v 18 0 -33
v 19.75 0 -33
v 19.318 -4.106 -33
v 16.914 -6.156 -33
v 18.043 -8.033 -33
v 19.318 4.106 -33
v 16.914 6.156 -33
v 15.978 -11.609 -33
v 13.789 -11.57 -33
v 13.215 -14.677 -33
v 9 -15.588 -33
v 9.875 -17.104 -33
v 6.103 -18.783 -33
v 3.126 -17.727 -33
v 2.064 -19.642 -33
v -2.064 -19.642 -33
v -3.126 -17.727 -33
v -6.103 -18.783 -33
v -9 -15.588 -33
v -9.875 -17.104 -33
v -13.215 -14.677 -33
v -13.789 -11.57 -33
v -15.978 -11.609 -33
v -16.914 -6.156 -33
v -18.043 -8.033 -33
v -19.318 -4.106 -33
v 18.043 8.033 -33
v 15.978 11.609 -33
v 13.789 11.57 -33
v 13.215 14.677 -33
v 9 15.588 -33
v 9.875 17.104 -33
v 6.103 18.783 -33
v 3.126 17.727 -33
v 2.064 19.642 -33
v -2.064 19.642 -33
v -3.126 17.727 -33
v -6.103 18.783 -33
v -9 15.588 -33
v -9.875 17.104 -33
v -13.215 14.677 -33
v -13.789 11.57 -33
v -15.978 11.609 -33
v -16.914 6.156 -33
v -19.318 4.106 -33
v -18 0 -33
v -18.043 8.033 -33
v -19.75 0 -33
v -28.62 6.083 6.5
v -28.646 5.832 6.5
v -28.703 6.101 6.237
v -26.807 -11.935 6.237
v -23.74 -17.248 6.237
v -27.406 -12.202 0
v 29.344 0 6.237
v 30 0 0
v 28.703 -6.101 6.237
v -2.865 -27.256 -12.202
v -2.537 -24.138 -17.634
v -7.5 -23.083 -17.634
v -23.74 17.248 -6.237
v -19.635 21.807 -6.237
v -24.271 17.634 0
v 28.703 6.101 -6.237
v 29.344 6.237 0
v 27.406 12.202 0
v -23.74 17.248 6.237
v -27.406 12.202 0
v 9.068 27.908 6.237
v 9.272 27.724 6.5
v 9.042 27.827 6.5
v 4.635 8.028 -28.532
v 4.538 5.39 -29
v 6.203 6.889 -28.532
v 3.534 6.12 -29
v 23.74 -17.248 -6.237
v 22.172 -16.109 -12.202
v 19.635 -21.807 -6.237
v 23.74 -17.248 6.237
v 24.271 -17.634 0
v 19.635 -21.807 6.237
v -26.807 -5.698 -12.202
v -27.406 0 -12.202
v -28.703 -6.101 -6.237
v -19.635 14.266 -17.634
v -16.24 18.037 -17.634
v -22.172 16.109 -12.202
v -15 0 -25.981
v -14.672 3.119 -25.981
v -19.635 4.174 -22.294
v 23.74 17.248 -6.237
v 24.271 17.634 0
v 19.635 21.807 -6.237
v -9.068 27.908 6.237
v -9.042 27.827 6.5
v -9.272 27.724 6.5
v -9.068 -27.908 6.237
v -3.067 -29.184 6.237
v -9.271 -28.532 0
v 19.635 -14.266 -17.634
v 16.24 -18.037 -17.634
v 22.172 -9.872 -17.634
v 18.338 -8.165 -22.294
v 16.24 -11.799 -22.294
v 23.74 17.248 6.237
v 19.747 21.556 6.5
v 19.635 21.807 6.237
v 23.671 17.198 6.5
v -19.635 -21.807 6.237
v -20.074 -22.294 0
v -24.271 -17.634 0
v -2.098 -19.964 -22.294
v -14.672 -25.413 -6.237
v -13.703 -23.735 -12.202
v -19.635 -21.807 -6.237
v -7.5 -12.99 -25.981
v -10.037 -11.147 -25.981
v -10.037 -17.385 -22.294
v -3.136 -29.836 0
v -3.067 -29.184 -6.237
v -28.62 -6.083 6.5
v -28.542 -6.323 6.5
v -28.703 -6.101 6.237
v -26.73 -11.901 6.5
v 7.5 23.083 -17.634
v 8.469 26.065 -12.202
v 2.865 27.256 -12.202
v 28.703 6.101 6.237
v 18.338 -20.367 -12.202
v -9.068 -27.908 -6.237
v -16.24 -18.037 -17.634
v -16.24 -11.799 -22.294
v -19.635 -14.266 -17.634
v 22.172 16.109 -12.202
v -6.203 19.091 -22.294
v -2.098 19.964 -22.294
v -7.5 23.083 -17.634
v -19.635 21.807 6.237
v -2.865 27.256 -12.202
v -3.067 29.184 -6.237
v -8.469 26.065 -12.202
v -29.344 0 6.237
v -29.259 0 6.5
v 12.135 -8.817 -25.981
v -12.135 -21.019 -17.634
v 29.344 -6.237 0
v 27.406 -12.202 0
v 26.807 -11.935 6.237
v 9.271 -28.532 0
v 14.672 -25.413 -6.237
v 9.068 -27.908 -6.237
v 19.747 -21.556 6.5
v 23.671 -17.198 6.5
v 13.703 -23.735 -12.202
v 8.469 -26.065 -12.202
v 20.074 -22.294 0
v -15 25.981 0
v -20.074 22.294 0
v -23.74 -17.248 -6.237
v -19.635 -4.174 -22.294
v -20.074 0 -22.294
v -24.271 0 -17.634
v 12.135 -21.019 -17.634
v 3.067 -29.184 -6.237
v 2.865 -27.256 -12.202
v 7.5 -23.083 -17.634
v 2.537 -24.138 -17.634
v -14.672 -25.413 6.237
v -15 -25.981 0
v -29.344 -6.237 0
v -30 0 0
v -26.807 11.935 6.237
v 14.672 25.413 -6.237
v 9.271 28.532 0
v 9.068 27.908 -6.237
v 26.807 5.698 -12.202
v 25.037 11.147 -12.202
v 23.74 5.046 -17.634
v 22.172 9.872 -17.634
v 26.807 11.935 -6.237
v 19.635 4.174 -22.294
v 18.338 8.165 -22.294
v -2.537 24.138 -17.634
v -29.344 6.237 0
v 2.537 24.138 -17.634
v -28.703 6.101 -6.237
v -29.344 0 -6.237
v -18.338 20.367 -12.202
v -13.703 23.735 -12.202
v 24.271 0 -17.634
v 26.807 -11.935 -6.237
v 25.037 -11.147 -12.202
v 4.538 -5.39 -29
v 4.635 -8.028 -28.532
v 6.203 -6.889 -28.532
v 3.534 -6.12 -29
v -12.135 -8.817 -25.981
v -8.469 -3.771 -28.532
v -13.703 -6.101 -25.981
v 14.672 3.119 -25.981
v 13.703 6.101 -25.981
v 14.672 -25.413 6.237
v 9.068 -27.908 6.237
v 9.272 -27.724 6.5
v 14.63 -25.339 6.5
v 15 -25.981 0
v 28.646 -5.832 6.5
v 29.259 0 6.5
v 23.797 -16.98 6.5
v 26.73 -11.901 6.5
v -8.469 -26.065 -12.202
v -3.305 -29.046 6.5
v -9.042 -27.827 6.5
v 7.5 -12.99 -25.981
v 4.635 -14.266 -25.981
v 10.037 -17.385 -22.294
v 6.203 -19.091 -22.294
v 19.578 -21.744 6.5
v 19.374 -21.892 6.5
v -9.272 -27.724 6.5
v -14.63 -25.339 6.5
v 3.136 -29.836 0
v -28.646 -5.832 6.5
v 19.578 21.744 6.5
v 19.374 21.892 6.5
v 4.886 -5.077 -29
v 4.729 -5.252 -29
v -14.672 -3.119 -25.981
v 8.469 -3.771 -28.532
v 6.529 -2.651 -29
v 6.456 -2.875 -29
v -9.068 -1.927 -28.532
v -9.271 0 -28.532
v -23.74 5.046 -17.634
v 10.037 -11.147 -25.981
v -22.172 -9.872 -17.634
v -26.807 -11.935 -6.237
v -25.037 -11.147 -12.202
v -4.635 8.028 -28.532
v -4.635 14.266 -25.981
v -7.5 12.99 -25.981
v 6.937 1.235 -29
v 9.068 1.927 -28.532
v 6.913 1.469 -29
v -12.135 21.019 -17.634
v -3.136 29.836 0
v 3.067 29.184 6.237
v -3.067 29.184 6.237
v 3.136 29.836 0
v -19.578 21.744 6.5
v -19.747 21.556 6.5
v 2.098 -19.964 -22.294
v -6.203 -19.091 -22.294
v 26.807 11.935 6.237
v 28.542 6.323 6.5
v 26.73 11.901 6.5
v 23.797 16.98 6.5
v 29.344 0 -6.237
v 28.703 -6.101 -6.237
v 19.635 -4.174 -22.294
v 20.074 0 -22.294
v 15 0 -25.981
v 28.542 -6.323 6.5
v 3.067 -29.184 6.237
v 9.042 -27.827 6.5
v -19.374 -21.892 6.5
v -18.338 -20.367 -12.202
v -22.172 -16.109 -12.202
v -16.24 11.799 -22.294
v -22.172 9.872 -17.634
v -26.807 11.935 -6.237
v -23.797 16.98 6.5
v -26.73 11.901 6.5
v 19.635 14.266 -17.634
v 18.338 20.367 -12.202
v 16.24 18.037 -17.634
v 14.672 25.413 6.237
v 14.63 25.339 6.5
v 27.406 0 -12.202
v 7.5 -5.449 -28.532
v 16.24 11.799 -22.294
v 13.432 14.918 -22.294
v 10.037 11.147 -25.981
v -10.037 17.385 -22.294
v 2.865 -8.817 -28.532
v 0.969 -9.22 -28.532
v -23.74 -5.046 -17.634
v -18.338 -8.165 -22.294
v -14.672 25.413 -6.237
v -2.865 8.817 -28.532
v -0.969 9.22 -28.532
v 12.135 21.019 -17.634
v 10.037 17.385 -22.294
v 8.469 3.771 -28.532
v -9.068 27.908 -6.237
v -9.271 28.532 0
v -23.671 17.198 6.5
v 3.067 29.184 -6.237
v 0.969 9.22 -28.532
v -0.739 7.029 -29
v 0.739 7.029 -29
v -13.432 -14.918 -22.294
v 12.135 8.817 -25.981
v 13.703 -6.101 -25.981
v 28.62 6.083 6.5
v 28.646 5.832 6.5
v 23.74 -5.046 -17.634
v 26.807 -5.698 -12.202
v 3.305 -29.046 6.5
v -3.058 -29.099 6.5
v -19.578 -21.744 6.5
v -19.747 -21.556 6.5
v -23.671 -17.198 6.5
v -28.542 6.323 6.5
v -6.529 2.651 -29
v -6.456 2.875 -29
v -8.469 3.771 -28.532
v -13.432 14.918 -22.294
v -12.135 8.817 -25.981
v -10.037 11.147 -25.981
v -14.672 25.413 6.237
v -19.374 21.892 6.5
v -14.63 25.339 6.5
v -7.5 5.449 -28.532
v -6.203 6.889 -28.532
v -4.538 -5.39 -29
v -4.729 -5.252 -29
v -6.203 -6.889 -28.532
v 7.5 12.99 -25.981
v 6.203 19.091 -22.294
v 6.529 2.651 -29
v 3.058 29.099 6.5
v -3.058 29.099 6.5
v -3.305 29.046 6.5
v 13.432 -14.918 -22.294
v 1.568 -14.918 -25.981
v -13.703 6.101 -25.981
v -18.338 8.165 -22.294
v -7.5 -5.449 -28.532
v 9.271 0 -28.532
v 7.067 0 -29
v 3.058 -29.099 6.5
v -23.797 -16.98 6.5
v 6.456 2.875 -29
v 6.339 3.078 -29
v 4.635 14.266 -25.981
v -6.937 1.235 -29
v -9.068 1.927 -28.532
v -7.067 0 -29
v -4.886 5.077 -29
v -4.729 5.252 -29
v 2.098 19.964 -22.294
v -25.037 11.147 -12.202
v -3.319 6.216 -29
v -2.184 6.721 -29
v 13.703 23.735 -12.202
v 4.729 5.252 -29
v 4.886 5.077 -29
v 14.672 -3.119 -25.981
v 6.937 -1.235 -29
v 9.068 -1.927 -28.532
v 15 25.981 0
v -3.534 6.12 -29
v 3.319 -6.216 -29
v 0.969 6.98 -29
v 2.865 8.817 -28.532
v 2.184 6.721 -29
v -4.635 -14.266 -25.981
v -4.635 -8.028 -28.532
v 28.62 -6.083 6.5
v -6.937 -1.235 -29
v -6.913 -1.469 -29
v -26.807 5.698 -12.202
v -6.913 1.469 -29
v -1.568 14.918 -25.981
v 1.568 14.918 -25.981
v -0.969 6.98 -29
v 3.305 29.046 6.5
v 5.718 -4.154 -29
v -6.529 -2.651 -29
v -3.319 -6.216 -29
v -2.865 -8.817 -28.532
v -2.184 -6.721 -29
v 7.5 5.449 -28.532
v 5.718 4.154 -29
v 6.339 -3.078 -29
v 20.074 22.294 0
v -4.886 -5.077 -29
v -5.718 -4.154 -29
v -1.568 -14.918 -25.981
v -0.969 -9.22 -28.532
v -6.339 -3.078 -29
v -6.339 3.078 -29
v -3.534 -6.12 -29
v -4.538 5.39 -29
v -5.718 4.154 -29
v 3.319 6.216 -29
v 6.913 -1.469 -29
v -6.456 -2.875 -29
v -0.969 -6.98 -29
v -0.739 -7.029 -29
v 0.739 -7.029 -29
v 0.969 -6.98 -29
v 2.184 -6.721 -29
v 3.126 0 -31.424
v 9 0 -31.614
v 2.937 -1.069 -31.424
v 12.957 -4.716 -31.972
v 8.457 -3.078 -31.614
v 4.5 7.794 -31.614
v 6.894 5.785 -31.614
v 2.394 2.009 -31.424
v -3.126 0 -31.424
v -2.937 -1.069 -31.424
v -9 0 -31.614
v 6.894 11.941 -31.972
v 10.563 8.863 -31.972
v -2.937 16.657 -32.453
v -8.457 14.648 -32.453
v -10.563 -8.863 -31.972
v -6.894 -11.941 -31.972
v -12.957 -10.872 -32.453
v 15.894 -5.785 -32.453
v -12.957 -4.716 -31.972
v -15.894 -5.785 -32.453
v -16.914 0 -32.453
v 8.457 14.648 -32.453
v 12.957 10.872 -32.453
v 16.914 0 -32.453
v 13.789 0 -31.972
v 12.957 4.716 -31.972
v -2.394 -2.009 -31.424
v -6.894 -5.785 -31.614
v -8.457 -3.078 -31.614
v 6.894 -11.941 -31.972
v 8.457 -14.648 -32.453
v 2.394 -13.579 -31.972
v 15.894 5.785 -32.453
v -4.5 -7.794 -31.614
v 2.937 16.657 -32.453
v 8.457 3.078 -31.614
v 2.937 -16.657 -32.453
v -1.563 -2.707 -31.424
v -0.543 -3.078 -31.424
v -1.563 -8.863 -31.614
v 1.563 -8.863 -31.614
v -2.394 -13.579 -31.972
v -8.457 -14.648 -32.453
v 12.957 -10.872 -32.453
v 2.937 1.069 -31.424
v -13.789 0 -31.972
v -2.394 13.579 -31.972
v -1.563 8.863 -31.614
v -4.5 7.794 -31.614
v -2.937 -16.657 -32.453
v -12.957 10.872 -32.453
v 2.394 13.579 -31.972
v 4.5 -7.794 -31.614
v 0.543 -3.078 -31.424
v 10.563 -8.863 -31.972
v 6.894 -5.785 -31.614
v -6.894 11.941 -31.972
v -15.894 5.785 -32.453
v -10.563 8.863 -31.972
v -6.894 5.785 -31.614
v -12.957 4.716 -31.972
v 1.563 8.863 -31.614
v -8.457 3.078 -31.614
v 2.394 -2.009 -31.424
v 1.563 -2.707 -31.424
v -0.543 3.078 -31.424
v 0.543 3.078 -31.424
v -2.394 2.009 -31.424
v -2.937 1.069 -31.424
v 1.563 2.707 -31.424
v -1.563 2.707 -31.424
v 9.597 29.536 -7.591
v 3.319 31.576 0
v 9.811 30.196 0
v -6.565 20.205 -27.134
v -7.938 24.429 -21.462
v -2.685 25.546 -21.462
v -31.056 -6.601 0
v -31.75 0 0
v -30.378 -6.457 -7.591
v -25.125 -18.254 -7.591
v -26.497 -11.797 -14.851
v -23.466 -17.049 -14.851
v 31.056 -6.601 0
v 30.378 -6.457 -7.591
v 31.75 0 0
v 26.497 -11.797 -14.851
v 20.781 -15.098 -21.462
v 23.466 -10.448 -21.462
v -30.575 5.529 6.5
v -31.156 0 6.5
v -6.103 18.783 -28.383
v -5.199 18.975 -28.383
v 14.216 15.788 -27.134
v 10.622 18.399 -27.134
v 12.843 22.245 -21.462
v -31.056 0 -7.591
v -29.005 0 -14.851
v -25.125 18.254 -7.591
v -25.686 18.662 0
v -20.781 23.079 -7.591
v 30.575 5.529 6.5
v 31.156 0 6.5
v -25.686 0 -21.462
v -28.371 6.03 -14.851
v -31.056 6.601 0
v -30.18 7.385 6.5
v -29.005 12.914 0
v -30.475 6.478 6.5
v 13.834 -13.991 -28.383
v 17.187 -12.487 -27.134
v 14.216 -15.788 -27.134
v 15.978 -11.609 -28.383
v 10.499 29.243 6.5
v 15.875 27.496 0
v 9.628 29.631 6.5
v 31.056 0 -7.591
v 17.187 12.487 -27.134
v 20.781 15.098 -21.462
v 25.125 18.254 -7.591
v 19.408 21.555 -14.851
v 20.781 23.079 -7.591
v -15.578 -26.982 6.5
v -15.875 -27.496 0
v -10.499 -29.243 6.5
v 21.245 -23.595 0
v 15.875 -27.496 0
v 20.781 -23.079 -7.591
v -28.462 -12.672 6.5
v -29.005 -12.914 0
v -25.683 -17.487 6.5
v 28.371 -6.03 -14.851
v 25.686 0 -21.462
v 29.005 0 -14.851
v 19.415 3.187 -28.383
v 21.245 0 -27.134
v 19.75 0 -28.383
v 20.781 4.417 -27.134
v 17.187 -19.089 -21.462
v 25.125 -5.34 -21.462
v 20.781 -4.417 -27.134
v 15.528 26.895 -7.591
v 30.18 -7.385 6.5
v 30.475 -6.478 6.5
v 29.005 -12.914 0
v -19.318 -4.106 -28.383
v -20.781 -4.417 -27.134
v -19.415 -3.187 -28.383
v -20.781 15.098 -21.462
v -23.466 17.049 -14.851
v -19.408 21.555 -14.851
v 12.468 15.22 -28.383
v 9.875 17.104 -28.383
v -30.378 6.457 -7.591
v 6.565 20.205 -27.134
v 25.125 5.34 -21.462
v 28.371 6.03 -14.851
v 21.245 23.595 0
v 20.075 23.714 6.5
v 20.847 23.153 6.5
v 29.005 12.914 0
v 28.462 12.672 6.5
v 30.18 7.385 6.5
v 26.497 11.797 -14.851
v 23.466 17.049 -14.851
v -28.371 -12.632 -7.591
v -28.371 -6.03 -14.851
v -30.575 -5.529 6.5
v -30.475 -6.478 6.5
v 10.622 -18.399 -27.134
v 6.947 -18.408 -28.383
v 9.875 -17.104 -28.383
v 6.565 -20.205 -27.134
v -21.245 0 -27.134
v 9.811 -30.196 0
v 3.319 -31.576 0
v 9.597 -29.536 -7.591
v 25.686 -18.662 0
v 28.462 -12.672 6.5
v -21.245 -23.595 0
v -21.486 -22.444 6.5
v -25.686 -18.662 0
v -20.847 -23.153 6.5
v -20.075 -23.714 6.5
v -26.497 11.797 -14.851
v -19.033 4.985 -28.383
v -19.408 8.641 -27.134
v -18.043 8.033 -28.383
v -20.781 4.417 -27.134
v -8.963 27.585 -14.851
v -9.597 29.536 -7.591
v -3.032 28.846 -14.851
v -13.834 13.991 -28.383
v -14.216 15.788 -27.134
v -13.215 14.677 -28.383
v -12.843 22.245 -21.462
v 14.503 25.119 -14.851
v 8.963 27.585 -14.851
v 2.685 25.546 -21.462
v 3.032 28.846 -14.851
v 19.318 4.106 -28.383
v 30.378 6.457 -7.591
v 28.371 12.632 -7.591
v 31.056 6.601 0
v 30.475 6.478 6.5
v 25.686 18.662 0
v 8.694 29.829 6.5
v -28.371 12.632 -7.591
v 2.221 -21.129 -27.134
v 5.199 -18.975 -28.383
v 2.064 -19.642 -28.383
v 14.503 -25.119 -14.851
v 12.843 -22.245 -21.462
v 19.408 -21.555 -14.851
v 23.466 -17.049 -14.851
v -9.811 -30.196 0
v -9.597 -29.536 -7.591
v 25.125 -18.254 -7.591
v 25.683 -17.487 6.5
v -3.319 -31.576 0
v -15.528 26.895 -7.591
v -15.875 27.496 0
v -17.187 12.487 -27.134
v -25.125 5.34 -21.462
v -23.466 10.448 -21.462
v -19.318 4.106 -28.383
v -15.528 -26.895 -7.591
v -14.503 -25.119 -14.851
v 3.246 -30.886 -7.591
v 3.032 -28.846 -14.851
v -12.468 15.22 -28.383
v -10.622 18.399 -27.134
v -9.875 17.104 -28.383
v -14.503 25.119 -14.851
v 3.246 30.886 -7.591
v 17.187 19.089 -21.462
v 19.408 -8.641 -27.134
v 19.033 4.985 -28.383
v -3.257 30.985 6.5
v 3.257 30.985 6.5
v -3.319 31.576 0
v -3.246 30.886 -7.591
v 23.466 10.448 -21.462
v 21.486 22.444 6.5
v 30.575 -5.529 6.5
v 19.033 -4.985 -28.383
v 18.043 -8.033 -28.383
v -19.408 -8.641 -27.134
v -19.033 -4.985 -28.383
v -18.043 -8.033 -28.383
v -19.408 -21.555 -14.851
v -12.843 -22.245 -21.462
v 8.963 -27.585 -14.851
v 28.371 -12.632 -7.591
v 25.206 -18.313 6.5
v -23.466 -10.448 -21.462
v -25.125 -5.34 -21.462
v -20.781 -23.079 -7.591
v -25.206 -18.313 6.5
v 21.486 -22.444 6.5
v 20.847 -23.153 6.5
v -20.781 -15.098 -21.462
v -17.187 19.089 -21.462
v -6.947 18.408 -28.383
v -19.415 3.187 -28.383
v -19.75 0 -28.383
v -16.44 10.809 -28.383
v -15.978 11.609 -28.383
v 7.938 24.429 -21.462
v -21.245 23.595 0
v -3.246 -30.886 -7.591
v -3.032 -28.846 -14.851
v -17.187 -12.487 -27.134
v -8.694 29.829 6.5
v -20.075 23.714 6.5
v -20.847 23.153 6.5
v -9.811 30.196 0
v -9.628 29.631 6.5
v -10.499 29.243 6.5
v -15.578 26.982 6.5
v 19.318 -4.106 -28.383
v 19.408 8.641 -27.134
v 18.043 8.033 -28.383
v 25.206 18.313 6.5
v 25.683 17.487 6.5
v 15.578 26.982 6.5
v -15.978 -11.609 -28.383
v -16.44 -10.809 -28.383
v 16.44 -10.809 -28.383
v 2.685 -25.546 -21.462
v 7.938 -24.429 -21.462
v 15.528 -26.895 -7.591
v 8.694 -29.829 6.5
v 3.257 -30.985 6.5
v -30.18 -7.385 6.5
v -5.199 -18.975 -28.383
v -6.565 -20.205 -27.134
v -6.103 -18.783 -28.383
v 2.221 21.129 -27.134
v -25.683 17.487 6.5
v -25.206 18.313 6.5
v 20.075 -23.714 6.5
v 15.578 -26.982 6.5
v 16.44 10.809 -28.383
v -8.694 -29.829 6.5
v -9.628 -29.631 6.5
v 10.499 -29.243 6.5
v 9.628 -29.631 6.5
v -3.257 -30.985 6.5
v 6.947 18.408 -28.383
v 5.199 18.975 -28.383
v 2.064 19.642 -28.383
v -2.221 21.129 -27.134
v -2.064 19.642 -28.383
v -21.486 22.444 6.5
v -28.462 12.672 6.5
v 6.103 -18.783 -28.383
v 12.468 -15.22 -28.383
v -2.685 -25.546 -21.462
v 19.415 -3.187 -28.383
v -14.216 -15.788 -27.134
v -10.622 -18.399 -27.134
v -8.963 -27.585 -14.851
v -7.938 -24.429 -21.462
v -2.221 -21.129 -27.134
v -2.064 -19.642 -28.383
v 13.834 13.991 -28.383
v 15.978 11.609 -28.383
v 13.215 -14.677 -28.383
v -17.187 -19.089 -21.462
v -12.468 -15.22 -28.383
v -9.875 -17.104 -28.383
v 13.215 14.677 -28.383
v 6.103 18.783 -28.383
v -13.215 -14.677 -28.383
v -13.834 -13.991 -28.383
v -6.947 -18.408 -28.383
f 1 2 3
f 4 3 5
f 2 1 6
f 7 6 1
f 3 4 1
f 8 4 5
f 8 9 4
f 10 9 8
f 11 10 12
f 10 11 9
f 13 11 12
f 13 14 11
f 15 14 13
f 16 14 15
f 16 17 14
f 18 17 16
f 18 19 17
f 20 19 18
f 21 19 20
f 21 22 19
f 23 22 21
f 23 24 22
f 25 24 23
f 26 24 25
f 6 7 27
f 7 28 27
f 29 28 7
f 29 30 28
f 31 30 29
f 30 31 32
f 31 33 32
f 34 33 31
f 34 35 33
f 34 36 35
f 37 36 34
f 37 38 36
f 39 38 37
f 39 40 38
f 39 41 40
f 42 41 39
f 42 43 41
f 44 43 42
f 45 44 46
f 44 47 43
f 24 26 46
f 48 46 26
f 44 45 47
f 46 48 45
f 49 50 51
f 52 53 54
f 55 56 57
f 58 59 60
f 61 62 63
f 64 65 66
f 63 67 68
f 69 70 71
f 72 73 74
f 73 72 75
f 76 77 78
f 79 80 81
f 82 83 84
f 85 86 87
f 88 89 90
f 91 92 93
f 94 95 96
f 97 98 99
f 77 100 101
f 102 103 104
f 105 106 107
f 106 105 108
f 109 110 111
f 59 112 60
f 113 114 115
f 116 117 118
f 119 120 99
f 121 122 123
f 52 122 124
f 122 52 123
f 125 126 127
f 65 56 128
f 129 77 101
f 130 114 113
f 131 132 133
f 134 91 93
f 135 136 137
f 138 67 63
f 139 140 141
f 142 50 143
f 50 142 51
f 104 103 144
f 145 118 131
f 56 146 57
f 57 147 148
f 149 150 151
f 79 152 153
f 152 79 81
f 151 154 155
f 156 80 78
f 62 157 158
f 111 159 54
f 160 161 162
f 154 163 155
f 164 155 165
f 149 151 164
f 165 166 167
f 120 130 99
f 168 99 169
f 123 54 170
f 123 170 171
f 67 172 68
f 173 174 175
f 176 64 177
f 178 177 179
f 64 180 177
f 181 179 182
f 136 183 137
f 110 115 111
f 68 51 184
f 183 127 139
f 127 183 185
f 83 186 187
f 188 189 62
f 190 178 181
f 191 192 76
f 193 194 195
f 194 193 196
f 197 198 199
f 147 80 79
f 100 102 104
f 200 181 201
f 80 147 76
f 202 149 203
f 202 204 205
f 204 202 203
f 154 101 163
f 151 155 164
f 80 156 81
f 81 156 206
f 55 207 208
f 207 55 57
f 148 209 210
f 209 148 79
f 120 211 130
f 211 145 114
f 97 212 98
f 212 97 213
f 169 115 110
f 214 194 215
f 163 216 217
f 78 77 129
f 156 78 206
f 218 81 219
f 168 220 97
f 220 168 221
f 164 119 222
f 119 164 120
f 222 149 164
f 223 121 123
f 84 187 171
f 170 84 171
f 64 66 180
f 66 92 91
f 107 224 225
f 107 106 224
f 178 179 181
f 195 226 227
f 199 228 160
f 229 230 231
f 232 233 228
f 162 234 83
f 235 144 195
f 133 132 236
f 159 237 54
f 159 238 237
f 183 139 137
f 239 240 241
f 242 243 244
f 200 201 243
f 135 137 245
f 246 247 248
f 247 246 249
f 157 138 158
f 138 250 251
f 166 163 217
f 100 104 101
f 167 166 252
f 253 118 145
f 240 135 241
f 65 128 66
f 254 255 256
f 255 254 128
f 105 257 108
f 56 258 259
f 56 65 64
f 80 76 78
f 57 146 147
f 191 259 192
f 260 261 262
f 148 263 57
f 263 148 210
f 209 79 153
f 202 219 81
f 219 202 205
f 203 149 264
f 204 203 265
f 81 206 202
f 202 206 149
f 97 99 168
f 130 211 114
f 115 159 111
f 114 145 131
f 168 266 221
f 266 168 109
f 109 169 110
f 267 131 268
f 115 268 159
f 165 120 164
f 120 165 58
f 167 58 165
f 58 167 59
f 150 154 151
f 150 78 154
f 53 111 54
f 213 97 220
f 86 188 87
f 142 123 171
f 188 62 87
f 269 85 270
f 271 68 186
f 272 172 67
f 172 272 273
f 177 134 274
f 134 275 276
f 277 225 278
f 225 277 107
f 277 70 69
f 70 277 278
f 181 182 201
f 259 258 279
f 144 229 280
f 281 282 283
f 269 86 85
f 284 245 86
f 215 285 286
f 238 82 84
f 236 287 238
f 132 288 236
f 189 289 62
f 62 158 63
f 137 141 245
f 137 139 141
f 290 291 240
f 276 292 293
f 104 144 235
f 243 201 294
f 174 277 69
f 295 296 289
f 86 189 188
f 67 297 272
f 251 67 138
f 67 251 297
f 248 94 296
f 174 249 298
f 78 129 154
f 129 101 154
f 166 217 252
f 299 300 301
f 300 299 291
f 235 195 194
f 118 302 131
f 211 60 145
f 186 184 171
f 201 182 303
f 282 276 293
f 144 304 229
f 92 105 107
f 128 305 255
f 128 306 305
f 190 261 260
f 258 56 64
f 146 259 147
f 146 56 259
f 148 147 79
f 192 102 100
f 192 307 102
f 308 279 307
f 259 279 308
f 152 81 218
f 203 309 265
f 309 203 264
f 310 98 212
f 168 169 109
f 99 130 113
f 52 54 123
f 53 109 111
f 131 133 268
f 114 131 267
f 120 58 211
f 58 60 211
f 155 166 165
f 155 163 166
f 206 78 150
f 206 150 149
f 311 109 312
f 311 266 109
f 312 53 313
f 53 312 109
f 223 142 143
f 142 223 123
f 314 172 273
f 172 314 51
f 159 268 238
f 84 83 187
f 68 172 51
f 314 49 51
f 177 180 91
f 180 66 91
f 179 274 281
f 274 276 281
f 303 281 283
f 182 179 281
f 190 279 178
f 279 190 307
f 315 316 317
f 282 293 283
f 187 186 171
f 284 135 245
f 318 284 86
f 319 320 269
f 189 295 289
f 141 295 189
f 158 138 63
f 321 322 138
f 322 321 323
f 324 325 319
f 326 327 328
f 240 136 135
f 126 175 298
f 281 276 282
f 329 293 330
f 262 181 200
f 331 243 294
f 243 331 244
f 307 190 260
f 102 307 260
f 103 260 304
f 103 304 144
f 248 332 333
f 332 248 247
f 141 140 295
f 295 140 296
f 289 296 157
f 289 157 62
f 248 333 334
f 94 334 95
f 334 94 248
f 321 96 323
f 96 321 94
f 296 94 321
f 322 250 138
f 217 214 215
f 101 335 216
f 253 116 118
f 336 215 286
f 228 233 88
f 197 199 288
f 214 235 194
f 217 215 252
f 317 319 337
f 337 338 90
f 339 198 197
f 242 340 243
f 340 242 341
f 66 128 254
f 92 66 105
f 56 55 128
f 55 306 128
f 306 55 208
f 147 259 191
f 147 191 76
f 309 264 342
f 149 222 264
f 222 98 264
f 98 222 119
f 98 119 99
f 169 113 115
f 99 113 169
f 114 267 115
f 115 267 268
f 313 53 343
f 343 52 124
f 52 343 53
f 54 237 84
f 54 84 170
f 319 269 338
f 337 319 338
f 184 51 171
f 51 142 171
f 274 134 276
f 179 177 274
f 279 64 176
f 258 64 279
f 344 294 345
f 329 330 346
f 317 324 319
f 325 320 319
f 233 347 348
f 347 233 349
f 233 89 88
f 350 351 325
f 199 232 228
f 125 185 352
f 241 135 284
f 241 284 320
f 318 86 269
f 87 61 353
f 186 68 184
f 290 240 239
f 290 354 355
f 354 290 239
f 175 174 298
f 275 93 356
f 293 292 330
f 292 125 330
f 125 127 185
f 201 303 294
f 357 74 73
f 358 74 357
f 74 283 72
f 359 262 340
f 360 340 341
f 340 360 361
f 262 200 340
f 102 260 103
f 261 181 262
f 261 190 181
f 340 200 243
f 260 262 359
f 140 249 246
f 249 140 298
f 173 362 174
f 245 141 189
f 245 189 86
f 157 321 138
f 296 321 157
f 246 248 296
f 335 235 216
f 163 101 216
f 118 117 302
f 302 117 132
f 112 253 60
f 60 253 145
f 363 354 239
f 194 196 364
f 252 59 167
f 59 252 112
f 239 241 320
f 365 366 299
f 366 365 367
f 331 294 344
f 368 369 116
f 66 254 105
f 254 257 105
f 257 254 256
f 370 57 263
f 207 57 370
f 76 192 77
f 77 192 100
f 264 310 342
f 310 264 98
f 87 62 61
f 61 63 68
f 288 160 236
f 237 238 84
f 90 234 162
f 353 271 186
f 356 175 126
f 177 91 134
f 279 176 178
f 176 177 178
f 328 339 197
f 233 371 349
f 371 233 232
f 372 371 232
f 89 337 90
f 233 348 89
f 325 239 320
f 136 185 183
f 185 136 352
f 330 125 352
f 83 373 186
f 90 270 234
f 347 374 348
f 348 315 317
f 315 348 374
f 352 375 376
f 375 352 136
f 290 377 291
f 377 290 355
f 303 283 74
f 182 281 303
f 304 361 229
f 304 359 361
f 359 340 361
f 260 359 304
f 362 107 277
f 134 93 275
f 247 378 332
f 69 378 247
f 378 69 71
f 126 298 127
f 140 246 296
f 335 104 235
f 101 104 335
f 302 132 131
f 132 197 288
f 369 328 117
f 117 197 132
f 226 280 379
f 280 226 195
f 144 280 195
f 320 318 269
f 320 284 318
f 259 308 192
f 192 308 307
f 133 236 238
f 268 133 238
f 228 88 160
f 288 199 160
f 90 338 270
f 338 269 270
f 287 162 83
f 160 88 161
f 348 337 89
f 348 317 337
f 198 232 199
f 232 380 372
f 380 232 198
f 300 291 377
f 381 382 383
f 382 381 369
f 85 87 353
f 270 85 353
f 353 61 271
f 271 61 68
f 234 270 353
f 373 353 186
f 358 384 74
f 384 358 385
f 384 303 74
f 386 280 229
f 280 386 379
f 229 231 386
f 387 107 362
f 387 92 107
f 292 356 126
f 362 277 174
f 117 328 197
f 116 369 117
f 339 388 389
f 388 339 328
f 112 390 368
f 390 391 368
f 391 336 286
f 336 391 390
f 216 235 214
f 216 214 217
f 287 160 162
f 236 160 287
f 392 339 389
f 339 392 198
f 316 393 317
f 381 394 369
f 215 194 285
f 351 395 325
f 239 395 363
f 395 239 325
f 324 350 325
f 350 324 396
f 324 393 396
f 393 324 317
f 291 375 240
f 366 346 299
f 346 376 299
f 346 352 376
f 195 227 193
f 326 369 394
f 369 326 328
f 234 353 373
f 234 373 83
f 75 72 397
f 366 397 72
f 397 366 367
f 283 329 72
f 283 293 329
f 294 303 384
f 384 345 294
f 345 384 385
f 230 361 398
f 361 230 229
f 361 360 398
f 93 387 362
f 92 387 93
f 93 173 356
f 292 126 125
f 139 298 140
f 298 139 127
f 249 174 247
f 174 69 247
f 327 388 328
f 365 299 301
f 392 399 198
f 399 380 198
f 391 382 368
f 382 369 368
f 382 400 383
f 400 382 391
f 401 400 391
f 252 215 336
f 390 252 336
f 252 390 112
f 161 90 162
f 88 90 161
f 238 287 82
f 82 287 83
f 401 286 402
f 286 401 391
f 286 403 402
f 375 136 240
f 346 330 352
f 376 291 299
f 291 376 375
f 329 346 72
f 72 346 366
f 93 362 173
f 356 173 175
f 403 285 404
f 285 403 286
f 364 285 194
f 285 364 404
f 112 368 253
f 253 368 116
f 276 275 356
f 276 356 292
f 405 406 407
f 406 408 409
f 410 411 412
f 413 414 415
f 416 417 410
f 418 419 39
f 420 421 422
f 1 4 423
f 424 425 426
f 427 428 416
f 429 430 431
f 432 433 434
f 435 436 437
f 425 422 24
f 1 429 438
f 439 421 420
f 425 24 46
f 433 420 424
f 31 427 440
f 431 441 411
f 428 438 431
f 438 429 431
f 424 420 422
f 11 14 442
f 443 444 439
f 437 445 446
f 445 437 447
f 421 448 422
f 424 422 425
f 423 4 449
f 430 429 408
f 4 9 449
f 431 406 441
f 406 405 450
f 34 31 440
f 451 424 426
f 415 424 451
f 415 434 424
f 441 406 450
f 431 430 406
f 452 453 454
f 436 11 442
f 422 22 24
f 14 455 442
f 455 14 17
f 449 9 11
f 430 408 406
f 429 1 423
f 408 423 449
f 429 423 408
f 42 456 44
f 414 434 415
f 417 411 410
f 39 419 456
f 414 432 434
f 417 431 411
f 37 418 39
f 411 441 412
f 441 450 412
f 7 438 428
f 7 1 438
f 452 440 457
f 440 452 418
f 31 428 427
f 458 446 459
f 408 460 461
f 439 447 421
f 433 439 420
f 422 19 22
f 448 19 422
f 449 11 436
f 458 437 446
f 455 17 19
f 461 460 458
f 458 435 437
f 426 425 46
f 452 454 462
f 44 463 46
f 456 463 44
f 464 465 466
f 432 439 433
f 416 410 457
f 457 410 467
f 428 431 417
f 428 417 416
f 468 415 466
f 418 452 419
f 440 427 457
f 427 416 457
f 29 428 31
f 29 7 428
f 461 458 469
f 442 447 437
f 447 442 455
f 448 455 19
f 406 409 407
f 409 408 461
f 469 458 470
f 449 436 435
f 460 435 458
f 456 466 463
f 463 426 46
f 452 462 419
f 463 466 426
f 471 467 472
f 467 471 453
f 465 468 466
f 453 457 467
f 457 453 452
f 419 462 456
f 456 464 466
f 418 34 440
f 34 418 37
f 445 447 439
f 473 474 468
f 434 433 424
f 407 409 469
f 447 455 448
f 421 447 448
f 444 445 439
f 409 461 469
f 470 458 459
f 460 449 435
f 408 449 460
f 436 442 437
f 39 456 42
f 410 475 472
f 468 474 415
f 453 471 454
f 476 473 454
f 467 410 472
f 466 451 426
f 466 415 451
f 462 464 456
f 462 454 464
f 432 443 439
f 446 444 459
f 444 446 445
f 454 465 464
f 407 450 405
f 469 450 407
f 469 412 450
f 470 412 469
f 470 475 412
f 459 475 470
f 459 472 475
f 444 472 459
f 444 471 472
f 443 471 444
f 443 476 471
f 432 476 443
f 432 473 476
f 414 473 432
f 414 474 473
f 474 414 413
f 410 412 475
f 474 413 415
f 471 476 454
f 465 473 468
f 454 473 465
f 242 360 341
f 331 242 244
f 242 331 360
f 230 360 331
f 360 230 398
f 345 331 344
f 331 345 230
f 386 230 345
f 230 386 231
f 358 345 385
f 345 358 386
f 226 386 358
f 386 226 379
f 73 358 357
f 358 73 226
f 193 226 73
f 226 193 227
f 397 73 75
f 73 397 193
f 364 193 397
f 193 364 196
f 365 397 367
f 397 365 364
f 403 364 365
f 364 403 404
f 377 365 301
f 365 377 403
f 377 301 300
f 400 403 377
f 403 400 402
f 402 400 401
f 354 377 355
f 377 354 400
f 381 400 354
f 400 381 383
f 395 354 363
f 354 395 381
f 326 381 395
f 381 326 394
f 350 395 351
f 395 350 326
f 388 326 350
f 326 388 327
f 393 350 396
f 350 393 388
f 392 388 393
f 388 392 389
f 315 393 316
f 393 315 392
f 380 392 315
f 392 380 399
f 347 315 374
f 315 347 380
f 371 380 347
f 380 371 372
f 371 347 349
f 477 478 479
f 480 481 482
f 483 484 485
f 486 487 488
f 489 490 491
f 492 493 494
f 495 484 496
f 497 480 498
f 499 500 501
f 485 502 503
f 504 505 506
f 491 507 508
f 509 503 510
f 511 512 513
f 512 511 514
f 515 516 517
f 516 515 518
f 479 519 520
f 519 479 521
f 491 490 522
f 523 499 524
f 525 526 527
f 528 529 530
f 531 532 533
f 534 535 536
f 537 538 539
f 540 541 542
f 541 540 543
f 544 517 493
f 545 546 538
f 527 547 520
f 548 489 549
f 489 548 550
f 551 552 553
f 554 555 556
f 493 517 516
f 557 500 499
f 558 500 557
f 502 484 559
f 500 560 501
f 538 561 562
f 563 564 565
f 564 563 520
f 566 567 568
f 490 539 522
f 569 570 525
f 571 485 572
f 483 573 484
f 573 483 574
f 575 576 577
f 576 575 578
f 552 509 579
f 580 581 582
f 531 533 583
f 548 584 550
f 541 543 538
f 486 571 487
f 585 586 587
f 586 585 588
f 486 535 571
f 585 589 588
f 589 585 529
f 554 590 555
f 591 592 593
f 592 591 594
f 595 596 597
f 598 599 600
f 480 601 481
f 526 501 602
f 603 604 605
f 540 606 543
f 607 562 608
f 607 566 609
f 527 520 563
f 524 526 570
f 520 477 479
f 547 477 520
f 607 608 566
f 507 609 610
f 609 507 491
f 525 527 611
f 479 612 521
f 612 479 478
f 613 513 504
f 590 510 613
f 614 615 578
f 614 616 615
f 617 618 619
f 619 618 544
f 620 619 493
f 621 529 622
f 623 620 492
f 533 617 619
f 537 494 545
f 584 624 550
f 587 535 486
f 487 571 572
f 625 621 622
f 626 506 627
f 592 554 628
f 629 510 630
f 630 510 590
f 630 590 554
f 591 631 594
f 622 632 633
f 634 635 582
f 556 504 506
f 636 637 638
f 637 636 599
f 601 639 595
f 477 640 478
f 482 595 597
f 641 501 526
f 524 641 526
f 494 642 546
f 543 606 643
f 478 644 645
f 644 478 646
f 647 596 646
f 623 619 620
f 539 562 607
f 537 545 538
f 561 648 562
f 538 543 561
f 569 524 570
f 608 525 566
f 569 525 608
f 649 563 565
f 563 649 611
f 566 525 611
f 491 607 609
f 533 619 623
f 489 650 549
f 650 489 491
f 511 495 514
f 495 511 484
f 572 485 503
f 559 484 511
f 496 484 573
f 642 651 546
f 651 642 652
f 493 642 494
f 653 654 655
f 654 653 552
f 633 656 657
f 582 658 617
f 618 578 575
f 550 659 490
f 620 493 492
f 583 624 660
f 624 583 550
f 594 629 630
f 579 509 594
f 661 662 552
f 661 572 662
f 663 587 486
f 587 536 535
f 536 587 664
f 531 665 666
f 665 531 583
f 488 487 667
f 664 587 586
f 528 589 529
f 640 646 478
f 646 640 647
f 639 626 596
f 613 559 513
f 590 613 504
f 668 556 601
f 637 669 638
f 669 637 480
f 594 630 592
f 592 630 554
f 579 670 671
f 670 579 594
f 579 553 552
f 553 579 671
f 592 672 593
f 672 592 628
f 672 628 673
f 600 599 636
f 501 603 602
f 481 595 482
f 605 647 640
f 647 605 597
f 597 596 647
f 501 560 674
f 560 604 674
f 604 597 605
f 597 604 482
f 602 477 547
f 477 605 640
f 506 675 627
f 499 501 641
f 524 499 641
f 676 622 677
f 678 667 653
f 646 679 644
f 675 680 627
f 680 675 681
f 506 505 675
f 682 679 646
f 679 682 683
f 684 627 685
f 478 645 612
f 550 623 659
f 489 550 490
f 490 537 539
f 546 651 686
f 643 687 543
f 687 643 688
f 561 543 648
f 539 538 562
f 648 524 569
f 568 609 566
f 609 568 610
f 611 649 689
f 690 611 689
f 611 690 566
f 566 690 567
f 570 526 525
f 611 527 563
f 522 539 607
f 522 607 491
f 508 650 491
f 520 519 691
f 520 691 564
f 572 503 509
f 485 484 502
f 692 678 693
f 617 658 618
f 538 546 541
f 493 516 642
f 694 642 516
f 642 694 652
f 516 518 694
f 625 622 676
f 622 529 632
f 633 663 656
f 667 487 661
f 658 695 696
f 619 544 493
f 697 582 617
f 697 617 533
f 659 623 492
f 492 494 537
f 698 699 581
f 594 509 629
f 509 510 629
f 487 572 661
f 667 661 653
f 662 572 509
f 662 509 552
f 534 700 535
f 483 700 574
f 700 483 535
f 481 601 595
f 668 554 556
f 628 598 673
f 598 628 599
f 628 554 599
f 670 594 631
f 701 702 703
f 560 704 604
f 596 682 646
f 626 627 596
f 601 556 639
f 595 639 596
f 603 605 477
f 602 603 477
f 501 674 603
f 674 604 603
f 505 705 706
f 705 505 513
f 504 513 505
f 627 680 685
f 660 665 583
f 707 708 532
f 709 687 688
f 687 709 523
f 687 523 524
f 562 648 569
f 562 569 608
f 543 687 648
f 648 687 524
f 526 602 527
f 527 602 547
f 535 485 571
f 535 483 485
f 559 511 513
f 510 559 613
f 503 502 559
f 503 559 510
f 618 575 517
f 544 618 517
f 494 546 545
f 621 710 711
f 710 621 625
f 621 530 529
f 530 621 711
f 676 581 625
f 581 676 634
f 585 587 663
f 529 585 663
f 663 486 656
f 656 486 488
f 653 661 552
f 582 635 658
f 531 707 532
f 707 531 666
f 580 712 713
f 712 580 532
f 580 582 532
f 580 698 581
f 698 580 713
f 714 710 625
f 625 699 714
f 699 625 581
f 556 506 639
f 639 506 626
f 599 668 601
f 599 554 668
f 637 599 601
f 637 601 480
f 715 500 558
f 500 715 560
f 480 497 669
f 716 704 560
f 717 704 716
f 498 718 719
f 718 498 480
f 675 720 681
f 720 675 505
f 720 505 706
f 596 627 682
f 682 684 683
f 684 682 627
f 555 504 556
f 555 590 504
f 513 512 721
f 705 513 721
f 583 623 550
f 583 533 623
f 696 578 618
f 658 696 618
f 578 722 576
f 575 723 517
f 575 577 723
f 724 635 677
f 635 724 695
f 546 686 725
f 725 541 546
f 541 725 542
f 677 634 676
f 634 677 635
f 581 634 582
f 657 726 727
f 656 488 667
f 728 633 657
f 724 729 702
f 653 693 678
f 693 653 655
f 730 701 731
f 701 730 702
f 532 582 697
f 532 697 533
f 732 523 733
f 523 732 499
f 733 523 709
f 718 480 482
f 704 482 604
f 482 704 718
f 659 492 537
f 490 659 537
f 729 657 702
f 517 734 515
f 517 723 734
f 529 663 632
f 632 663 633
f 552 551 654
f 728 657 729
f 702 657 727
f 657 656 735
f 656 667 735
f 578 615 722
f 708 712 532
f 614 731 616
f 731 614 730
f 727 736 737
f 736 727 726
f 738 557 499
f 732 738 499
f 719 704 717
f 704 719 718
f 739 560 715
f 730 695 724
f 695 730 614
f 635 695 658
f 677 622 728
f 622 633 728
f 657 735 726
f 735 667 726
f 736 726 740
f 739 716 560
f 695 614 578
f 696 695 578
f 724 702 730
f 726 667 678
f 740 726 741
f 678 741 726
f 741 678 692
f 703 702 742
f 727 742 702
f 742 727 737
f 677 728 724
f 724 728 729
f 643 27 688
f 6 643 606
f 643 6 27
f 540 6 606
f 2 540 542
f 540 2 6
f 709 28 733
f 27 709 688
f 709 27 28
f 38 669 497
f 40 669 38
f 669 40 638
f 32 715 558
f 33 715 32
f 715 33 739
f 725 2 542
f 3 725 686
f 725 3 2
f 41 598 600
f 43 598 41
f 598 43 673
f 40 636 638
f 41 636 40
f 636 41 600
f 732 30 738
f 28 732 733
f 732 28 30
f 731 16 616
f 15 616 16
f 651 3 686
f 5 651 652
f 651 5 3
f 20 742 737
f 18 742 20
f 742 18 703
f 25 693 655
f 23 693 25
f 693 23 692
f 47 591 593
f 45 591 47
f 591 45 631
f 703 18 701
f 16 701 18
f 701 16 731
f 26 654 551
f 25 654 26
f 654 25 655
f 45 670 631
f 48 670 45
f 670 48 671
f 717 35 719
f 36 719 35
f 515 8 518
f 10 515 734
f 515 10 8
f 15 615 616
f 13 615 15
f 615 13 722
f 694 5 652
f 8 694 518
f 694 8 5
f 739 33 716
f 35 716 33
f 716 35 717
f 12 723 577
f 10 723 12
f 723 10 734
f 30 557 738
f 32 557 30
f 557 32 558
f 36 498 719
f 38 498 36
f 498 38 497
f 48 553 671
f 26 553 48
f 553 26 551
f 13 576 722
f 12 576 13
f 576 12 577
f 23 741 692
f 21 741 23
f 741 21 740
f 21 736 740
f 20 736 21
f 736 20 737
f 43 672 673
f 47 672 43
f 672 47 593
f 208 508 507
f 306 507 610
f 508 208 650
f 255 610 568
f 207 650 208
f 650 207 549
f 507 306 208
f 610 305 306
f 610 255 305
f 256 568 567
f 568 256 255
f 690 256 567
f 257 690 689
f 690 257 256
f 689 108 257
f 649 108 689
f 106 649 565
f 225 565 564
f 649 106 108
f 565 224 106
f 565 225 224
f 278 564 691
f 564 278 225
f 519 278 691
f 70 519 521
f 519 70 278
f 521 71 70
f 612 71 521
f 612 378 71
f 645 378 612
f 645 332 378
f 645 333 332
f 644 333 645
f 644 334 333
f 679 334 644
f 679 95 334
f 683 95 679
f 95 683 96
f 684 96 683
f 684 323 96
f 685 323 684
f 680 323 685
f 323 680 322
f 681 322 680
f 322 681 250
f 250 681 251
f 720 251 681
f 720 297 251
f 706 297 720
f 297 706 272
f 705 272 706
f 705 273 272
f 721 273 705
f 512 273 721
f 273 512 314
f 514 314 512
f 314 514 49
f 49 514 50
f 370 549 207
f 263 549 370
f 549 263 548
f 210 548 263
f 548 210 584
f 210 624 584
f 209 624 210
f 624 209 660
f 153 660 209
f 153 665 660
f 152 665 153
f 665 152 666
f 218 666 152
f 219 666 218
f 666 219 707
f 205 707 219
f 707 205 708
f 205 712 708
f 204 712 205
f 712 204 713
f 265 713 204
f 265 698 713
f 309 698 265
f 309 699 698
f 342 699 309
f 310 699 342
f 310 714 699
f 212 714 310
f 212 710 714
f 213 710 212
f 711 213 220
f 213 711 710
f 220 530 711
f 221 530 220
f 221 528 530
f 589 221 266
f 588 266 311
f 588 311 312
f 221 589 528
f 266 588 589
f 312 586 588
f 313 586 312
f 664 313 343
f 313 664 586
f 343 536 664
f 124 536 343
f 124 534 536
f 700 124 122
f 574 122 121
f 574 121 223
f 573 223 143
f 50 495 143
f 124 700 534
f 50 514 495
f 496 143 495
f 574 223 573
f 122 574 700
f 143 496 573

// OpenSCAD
module handle()
{
    minkowski()
    {
        difference()
        {
            hull()
            {
                translate([25,0,-8])
                    rotate([90,30,0]) scale([1,1.5,1]) cylinder(h=0.1, r=12);
                translate([36,0,-3])
                    rotate([90,0,0]) scale([1,1,1]) cylinder(h=0.1, r=12);
            }
            
            hull()
            {
                translate([25,0,-8])
                    rotate([90,30,0]) scale([1,1.5,1]) cylinder(h=0.1, r=11);
                translate([36,0,-3])
                    rotate([90,0,0]) scale([1,1,1]) cylinder(h=0.1, r=11);
            }
            
            sphere(r = 31.75);
            hollowing();
        }
        scale([1,3.3,1]) sphere(1.75);
    }
}

module hollowing()
{
    sphere(r = 30);
    translate([-200,-200,10]) cube([400,400,100]);
        
    translate([0,0,-33]) scale([0.9,0.9,0.08])sphere(r = 20, $fn = 18);
    translate([0,0,-63]) cylinder(r = 20, h = 30);
}

module deco_hollowing()
{
    for(i = [0:1:8]) rotate([0,0,40*i]) translate([34,0,0]) rotate([0,18,0])
    {
        scale([2.5,12,55]) sphere(r=1, $fn=4);
    }
}

module cup()
{
    difference()
    {
        union()
        { 
            scale([1,1,1.15]) sphere(r = 32);
            translate([0,0,-33]) cylinder(r = 20, h = 30); 
        }
        
        hollowing();
        //deco_hollowing();
    }
    
    translate([0,0,-31]) cylinder(r = 20, h = 2); 
    translate([0,0,-33]) ;
}

module color1()
{
    intersection()
    {
        cup();
        union()
        {
            difference()
            {
                translate([0,0,-32.5]) cylinder(r = 20, h = 5); 
                translate([0,0,-33]) cylinder(r = 18, h = 11); 
            }
            translate([0,0,6]) cylinder(r = 50, h = 50); 
        }
    }
    handle();
}
 
module color2()
{
    intersection()
    {
        cup();
        
        translate([0,0,-50]) cylinder(r = 50, h = 56.5); 
        union()
        {
            scale([1,1,1.15]) sphere(r = 31.75);
            translate([0,0,-33]) cylinder(r = 19.75, h = 30); 
        }
    } 
}
 
color([1,1,1]) color2();  
//color1();
